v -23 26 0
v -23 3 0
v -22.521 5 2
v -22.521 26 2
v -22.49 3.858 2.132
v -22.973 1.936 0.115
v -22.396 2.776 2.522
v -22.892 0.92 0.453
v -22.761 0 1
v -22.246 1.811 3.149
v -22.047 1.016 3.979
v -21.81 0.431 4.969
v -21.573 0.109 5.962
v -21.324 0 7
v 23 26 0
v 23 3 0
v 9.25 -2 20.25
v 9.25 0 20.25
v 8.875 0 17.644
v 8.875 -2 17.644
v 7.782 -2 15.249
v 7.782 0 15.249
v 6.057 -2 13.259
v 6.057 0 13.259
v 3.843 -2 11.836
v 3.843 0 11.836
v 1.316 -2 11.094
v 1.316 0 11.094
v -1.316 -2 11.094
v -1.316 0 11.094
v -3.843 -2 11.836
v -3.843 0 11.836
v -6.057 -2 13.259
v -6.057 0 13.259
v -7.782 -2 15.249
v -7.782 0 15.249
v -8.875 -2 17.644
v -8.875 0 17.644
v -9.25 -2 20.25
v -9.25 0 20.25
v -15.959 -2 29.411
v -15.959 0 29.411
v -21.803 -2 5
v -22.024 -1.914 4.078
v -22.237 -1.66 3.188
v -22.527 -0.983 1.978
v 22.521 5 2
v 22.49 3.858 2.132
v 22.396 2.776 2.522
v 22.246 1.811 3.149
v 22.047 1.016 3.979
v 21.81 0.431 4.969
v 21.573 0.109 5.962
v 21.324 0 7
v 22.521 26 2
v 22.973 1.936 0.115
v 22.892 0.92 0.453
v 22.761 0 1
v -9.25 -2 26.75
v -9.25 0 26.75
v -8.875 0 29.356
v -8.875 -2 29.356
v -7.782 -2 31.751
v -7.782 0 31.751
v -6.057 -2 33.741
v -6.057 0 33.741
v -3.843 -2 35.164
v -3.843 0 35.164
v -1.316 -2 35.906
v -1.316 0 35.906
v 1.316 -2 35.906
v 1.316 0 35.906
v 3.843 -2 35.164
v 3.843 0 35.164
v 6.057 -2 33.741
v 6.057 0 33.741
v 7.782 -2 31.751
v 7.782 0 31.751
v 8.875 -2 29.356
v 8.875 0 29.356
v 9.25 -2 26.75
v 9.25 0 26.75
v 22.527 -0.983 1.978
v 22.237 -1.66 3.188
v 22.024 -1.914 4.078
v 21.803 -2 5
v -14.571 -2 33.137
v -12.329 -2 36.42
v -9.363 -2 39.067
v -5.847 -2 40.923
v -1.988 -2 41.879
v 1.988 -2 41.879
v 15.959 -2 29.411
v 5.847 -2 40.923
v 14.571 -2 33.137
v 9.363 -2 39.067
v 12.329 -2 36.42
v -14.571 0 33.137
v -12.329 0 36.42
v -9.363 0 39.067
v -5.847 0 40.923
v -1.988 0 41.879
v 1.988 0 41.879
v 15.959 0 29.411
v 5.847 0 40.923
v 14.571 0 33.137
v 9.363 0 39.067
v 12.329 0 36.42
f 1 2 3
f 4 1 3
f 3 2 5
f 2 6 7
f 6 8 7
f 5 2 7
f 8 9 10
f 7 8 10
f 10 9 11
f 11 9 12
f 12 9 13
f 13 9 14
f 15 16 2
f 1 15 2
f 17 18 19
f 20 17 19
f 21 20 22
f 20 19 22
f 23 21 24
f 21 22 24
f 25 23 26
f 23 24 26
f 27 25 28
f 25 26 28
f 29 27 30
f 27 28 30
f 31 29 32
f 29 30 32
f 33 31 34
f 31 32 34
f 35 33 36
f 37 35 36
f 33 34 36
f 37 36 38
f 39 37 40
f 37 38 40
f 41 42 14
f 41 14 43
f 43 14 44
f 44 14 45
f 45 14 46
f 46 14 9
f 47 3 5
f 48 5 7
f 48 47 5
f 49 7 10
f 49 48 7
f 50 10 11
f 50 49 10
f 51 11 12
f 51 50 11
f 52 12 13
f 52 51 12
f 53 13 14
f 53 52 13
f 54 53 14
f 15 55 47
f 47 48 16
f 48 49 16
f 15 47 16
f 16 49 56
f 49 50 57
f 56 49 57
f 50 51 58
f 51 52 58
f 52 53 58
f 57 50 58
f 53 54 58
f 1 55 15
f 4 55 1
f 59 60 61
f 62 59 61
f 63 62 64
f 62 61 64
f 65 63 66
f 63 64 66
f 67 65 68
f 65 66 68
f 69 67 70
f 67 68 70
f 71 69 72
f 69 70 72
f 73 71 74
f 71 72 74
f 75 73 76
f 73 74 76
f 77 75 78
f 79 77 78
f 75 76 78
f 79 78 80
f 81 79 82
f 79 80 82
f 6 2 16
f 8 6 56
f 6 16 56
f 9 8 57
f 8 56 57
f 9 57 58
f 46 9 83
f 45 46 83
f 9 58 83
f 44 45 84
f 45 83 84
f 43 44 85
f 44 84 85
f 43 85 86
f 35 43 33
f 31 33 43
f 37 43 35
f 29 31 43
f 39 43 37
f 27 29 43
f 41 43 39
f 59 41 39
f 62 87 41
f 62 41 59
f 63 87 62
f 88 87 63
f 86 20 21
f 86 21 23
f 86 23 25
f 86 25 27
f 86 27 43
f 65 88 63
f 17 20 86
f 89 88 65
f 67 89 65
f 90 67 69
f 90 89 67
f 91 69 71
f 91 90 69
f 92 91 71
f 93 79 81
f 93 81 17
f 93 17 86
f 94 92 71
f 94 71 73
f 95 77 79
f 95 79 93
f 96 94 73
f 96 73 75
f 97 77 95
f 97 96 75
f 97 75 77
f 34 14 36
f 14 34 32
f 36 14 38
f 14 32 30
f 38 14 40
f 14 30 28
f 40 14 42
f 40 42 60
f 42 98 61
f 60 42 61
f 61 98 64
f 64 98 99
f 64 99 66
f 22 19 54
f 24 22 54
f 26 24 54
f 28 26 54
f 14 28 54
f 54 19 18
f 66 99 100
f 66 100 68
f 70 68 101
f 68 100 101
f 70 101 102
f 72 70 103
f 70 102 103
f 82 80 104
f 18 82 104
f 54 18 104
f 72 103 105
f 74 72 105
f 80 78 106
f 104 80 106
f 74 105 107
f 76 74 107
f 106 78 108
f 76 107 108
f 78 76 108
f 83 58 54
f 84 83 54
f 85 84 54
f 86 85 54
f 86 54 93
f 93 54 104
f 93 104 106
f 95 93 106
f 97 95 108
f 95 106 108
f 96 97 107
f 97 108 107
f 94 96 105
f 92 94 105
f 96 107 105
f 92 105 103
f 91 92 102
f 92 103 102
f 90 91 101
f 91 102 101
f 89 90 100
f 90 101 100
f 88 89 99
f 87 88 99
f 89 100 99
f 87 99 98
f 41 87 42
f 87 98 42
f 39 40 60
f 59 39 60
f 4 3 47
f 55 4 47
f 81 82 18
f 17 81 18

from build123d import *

# Parameters (mm, degrees)
F1_DEPTH = 2
F3_DEPTH = 26
F4_R     = 5


with BuildPart() as f1:
    # F0 (on Front) → F1 (new body)
    with BuildSketch(Plane.XZ):
        with BuildLine():
            Line((-15.958655, 29.411045), (-23, 0))
            Line((-23, 0), (23, 0))
            Line((23, 0), (15.958655, 29.411045))
            ThreePointArc((15.958655, 29.411045), (0, 42), (-15.958655, 29.411045))
        make_face()
        with BuildLine():
            Line((-9.25, 20.25), (-9.25, 26.75))
            ThreePointArc((-9.25, 26.75), (0, 36), (9.25, 26.75))
            Line((9.25, 26.75), (9.25, 20.25))
            ThreePointArc((9.25, 20.25), (0, 11), (-9.25, 20.25))
        make_face(mode=Mode.SUBTRACT)
    extrude(amount=F1_DEPTH)

    # F2 (on face) → F3 (join)
    with BuildSketch(Plane(origin=(0, 0, 0), x_dir=(-1, 0, 0), z_dir=(0, 1, 0))):
        Polygon((22.521177, 2), (-22.521177, 2), (-23, 0), (23, 0), align=None)
    extrude(amount=F3_DEPTH)

    # F4
    f4_edges = [f1.edges().sort_by_distance(p)[0] for p in [
        (0, -2, 0),
        (0, 0, 2),
    ]]
    fillet(f4_edges, radius=F4_R)


solid = f1.part
